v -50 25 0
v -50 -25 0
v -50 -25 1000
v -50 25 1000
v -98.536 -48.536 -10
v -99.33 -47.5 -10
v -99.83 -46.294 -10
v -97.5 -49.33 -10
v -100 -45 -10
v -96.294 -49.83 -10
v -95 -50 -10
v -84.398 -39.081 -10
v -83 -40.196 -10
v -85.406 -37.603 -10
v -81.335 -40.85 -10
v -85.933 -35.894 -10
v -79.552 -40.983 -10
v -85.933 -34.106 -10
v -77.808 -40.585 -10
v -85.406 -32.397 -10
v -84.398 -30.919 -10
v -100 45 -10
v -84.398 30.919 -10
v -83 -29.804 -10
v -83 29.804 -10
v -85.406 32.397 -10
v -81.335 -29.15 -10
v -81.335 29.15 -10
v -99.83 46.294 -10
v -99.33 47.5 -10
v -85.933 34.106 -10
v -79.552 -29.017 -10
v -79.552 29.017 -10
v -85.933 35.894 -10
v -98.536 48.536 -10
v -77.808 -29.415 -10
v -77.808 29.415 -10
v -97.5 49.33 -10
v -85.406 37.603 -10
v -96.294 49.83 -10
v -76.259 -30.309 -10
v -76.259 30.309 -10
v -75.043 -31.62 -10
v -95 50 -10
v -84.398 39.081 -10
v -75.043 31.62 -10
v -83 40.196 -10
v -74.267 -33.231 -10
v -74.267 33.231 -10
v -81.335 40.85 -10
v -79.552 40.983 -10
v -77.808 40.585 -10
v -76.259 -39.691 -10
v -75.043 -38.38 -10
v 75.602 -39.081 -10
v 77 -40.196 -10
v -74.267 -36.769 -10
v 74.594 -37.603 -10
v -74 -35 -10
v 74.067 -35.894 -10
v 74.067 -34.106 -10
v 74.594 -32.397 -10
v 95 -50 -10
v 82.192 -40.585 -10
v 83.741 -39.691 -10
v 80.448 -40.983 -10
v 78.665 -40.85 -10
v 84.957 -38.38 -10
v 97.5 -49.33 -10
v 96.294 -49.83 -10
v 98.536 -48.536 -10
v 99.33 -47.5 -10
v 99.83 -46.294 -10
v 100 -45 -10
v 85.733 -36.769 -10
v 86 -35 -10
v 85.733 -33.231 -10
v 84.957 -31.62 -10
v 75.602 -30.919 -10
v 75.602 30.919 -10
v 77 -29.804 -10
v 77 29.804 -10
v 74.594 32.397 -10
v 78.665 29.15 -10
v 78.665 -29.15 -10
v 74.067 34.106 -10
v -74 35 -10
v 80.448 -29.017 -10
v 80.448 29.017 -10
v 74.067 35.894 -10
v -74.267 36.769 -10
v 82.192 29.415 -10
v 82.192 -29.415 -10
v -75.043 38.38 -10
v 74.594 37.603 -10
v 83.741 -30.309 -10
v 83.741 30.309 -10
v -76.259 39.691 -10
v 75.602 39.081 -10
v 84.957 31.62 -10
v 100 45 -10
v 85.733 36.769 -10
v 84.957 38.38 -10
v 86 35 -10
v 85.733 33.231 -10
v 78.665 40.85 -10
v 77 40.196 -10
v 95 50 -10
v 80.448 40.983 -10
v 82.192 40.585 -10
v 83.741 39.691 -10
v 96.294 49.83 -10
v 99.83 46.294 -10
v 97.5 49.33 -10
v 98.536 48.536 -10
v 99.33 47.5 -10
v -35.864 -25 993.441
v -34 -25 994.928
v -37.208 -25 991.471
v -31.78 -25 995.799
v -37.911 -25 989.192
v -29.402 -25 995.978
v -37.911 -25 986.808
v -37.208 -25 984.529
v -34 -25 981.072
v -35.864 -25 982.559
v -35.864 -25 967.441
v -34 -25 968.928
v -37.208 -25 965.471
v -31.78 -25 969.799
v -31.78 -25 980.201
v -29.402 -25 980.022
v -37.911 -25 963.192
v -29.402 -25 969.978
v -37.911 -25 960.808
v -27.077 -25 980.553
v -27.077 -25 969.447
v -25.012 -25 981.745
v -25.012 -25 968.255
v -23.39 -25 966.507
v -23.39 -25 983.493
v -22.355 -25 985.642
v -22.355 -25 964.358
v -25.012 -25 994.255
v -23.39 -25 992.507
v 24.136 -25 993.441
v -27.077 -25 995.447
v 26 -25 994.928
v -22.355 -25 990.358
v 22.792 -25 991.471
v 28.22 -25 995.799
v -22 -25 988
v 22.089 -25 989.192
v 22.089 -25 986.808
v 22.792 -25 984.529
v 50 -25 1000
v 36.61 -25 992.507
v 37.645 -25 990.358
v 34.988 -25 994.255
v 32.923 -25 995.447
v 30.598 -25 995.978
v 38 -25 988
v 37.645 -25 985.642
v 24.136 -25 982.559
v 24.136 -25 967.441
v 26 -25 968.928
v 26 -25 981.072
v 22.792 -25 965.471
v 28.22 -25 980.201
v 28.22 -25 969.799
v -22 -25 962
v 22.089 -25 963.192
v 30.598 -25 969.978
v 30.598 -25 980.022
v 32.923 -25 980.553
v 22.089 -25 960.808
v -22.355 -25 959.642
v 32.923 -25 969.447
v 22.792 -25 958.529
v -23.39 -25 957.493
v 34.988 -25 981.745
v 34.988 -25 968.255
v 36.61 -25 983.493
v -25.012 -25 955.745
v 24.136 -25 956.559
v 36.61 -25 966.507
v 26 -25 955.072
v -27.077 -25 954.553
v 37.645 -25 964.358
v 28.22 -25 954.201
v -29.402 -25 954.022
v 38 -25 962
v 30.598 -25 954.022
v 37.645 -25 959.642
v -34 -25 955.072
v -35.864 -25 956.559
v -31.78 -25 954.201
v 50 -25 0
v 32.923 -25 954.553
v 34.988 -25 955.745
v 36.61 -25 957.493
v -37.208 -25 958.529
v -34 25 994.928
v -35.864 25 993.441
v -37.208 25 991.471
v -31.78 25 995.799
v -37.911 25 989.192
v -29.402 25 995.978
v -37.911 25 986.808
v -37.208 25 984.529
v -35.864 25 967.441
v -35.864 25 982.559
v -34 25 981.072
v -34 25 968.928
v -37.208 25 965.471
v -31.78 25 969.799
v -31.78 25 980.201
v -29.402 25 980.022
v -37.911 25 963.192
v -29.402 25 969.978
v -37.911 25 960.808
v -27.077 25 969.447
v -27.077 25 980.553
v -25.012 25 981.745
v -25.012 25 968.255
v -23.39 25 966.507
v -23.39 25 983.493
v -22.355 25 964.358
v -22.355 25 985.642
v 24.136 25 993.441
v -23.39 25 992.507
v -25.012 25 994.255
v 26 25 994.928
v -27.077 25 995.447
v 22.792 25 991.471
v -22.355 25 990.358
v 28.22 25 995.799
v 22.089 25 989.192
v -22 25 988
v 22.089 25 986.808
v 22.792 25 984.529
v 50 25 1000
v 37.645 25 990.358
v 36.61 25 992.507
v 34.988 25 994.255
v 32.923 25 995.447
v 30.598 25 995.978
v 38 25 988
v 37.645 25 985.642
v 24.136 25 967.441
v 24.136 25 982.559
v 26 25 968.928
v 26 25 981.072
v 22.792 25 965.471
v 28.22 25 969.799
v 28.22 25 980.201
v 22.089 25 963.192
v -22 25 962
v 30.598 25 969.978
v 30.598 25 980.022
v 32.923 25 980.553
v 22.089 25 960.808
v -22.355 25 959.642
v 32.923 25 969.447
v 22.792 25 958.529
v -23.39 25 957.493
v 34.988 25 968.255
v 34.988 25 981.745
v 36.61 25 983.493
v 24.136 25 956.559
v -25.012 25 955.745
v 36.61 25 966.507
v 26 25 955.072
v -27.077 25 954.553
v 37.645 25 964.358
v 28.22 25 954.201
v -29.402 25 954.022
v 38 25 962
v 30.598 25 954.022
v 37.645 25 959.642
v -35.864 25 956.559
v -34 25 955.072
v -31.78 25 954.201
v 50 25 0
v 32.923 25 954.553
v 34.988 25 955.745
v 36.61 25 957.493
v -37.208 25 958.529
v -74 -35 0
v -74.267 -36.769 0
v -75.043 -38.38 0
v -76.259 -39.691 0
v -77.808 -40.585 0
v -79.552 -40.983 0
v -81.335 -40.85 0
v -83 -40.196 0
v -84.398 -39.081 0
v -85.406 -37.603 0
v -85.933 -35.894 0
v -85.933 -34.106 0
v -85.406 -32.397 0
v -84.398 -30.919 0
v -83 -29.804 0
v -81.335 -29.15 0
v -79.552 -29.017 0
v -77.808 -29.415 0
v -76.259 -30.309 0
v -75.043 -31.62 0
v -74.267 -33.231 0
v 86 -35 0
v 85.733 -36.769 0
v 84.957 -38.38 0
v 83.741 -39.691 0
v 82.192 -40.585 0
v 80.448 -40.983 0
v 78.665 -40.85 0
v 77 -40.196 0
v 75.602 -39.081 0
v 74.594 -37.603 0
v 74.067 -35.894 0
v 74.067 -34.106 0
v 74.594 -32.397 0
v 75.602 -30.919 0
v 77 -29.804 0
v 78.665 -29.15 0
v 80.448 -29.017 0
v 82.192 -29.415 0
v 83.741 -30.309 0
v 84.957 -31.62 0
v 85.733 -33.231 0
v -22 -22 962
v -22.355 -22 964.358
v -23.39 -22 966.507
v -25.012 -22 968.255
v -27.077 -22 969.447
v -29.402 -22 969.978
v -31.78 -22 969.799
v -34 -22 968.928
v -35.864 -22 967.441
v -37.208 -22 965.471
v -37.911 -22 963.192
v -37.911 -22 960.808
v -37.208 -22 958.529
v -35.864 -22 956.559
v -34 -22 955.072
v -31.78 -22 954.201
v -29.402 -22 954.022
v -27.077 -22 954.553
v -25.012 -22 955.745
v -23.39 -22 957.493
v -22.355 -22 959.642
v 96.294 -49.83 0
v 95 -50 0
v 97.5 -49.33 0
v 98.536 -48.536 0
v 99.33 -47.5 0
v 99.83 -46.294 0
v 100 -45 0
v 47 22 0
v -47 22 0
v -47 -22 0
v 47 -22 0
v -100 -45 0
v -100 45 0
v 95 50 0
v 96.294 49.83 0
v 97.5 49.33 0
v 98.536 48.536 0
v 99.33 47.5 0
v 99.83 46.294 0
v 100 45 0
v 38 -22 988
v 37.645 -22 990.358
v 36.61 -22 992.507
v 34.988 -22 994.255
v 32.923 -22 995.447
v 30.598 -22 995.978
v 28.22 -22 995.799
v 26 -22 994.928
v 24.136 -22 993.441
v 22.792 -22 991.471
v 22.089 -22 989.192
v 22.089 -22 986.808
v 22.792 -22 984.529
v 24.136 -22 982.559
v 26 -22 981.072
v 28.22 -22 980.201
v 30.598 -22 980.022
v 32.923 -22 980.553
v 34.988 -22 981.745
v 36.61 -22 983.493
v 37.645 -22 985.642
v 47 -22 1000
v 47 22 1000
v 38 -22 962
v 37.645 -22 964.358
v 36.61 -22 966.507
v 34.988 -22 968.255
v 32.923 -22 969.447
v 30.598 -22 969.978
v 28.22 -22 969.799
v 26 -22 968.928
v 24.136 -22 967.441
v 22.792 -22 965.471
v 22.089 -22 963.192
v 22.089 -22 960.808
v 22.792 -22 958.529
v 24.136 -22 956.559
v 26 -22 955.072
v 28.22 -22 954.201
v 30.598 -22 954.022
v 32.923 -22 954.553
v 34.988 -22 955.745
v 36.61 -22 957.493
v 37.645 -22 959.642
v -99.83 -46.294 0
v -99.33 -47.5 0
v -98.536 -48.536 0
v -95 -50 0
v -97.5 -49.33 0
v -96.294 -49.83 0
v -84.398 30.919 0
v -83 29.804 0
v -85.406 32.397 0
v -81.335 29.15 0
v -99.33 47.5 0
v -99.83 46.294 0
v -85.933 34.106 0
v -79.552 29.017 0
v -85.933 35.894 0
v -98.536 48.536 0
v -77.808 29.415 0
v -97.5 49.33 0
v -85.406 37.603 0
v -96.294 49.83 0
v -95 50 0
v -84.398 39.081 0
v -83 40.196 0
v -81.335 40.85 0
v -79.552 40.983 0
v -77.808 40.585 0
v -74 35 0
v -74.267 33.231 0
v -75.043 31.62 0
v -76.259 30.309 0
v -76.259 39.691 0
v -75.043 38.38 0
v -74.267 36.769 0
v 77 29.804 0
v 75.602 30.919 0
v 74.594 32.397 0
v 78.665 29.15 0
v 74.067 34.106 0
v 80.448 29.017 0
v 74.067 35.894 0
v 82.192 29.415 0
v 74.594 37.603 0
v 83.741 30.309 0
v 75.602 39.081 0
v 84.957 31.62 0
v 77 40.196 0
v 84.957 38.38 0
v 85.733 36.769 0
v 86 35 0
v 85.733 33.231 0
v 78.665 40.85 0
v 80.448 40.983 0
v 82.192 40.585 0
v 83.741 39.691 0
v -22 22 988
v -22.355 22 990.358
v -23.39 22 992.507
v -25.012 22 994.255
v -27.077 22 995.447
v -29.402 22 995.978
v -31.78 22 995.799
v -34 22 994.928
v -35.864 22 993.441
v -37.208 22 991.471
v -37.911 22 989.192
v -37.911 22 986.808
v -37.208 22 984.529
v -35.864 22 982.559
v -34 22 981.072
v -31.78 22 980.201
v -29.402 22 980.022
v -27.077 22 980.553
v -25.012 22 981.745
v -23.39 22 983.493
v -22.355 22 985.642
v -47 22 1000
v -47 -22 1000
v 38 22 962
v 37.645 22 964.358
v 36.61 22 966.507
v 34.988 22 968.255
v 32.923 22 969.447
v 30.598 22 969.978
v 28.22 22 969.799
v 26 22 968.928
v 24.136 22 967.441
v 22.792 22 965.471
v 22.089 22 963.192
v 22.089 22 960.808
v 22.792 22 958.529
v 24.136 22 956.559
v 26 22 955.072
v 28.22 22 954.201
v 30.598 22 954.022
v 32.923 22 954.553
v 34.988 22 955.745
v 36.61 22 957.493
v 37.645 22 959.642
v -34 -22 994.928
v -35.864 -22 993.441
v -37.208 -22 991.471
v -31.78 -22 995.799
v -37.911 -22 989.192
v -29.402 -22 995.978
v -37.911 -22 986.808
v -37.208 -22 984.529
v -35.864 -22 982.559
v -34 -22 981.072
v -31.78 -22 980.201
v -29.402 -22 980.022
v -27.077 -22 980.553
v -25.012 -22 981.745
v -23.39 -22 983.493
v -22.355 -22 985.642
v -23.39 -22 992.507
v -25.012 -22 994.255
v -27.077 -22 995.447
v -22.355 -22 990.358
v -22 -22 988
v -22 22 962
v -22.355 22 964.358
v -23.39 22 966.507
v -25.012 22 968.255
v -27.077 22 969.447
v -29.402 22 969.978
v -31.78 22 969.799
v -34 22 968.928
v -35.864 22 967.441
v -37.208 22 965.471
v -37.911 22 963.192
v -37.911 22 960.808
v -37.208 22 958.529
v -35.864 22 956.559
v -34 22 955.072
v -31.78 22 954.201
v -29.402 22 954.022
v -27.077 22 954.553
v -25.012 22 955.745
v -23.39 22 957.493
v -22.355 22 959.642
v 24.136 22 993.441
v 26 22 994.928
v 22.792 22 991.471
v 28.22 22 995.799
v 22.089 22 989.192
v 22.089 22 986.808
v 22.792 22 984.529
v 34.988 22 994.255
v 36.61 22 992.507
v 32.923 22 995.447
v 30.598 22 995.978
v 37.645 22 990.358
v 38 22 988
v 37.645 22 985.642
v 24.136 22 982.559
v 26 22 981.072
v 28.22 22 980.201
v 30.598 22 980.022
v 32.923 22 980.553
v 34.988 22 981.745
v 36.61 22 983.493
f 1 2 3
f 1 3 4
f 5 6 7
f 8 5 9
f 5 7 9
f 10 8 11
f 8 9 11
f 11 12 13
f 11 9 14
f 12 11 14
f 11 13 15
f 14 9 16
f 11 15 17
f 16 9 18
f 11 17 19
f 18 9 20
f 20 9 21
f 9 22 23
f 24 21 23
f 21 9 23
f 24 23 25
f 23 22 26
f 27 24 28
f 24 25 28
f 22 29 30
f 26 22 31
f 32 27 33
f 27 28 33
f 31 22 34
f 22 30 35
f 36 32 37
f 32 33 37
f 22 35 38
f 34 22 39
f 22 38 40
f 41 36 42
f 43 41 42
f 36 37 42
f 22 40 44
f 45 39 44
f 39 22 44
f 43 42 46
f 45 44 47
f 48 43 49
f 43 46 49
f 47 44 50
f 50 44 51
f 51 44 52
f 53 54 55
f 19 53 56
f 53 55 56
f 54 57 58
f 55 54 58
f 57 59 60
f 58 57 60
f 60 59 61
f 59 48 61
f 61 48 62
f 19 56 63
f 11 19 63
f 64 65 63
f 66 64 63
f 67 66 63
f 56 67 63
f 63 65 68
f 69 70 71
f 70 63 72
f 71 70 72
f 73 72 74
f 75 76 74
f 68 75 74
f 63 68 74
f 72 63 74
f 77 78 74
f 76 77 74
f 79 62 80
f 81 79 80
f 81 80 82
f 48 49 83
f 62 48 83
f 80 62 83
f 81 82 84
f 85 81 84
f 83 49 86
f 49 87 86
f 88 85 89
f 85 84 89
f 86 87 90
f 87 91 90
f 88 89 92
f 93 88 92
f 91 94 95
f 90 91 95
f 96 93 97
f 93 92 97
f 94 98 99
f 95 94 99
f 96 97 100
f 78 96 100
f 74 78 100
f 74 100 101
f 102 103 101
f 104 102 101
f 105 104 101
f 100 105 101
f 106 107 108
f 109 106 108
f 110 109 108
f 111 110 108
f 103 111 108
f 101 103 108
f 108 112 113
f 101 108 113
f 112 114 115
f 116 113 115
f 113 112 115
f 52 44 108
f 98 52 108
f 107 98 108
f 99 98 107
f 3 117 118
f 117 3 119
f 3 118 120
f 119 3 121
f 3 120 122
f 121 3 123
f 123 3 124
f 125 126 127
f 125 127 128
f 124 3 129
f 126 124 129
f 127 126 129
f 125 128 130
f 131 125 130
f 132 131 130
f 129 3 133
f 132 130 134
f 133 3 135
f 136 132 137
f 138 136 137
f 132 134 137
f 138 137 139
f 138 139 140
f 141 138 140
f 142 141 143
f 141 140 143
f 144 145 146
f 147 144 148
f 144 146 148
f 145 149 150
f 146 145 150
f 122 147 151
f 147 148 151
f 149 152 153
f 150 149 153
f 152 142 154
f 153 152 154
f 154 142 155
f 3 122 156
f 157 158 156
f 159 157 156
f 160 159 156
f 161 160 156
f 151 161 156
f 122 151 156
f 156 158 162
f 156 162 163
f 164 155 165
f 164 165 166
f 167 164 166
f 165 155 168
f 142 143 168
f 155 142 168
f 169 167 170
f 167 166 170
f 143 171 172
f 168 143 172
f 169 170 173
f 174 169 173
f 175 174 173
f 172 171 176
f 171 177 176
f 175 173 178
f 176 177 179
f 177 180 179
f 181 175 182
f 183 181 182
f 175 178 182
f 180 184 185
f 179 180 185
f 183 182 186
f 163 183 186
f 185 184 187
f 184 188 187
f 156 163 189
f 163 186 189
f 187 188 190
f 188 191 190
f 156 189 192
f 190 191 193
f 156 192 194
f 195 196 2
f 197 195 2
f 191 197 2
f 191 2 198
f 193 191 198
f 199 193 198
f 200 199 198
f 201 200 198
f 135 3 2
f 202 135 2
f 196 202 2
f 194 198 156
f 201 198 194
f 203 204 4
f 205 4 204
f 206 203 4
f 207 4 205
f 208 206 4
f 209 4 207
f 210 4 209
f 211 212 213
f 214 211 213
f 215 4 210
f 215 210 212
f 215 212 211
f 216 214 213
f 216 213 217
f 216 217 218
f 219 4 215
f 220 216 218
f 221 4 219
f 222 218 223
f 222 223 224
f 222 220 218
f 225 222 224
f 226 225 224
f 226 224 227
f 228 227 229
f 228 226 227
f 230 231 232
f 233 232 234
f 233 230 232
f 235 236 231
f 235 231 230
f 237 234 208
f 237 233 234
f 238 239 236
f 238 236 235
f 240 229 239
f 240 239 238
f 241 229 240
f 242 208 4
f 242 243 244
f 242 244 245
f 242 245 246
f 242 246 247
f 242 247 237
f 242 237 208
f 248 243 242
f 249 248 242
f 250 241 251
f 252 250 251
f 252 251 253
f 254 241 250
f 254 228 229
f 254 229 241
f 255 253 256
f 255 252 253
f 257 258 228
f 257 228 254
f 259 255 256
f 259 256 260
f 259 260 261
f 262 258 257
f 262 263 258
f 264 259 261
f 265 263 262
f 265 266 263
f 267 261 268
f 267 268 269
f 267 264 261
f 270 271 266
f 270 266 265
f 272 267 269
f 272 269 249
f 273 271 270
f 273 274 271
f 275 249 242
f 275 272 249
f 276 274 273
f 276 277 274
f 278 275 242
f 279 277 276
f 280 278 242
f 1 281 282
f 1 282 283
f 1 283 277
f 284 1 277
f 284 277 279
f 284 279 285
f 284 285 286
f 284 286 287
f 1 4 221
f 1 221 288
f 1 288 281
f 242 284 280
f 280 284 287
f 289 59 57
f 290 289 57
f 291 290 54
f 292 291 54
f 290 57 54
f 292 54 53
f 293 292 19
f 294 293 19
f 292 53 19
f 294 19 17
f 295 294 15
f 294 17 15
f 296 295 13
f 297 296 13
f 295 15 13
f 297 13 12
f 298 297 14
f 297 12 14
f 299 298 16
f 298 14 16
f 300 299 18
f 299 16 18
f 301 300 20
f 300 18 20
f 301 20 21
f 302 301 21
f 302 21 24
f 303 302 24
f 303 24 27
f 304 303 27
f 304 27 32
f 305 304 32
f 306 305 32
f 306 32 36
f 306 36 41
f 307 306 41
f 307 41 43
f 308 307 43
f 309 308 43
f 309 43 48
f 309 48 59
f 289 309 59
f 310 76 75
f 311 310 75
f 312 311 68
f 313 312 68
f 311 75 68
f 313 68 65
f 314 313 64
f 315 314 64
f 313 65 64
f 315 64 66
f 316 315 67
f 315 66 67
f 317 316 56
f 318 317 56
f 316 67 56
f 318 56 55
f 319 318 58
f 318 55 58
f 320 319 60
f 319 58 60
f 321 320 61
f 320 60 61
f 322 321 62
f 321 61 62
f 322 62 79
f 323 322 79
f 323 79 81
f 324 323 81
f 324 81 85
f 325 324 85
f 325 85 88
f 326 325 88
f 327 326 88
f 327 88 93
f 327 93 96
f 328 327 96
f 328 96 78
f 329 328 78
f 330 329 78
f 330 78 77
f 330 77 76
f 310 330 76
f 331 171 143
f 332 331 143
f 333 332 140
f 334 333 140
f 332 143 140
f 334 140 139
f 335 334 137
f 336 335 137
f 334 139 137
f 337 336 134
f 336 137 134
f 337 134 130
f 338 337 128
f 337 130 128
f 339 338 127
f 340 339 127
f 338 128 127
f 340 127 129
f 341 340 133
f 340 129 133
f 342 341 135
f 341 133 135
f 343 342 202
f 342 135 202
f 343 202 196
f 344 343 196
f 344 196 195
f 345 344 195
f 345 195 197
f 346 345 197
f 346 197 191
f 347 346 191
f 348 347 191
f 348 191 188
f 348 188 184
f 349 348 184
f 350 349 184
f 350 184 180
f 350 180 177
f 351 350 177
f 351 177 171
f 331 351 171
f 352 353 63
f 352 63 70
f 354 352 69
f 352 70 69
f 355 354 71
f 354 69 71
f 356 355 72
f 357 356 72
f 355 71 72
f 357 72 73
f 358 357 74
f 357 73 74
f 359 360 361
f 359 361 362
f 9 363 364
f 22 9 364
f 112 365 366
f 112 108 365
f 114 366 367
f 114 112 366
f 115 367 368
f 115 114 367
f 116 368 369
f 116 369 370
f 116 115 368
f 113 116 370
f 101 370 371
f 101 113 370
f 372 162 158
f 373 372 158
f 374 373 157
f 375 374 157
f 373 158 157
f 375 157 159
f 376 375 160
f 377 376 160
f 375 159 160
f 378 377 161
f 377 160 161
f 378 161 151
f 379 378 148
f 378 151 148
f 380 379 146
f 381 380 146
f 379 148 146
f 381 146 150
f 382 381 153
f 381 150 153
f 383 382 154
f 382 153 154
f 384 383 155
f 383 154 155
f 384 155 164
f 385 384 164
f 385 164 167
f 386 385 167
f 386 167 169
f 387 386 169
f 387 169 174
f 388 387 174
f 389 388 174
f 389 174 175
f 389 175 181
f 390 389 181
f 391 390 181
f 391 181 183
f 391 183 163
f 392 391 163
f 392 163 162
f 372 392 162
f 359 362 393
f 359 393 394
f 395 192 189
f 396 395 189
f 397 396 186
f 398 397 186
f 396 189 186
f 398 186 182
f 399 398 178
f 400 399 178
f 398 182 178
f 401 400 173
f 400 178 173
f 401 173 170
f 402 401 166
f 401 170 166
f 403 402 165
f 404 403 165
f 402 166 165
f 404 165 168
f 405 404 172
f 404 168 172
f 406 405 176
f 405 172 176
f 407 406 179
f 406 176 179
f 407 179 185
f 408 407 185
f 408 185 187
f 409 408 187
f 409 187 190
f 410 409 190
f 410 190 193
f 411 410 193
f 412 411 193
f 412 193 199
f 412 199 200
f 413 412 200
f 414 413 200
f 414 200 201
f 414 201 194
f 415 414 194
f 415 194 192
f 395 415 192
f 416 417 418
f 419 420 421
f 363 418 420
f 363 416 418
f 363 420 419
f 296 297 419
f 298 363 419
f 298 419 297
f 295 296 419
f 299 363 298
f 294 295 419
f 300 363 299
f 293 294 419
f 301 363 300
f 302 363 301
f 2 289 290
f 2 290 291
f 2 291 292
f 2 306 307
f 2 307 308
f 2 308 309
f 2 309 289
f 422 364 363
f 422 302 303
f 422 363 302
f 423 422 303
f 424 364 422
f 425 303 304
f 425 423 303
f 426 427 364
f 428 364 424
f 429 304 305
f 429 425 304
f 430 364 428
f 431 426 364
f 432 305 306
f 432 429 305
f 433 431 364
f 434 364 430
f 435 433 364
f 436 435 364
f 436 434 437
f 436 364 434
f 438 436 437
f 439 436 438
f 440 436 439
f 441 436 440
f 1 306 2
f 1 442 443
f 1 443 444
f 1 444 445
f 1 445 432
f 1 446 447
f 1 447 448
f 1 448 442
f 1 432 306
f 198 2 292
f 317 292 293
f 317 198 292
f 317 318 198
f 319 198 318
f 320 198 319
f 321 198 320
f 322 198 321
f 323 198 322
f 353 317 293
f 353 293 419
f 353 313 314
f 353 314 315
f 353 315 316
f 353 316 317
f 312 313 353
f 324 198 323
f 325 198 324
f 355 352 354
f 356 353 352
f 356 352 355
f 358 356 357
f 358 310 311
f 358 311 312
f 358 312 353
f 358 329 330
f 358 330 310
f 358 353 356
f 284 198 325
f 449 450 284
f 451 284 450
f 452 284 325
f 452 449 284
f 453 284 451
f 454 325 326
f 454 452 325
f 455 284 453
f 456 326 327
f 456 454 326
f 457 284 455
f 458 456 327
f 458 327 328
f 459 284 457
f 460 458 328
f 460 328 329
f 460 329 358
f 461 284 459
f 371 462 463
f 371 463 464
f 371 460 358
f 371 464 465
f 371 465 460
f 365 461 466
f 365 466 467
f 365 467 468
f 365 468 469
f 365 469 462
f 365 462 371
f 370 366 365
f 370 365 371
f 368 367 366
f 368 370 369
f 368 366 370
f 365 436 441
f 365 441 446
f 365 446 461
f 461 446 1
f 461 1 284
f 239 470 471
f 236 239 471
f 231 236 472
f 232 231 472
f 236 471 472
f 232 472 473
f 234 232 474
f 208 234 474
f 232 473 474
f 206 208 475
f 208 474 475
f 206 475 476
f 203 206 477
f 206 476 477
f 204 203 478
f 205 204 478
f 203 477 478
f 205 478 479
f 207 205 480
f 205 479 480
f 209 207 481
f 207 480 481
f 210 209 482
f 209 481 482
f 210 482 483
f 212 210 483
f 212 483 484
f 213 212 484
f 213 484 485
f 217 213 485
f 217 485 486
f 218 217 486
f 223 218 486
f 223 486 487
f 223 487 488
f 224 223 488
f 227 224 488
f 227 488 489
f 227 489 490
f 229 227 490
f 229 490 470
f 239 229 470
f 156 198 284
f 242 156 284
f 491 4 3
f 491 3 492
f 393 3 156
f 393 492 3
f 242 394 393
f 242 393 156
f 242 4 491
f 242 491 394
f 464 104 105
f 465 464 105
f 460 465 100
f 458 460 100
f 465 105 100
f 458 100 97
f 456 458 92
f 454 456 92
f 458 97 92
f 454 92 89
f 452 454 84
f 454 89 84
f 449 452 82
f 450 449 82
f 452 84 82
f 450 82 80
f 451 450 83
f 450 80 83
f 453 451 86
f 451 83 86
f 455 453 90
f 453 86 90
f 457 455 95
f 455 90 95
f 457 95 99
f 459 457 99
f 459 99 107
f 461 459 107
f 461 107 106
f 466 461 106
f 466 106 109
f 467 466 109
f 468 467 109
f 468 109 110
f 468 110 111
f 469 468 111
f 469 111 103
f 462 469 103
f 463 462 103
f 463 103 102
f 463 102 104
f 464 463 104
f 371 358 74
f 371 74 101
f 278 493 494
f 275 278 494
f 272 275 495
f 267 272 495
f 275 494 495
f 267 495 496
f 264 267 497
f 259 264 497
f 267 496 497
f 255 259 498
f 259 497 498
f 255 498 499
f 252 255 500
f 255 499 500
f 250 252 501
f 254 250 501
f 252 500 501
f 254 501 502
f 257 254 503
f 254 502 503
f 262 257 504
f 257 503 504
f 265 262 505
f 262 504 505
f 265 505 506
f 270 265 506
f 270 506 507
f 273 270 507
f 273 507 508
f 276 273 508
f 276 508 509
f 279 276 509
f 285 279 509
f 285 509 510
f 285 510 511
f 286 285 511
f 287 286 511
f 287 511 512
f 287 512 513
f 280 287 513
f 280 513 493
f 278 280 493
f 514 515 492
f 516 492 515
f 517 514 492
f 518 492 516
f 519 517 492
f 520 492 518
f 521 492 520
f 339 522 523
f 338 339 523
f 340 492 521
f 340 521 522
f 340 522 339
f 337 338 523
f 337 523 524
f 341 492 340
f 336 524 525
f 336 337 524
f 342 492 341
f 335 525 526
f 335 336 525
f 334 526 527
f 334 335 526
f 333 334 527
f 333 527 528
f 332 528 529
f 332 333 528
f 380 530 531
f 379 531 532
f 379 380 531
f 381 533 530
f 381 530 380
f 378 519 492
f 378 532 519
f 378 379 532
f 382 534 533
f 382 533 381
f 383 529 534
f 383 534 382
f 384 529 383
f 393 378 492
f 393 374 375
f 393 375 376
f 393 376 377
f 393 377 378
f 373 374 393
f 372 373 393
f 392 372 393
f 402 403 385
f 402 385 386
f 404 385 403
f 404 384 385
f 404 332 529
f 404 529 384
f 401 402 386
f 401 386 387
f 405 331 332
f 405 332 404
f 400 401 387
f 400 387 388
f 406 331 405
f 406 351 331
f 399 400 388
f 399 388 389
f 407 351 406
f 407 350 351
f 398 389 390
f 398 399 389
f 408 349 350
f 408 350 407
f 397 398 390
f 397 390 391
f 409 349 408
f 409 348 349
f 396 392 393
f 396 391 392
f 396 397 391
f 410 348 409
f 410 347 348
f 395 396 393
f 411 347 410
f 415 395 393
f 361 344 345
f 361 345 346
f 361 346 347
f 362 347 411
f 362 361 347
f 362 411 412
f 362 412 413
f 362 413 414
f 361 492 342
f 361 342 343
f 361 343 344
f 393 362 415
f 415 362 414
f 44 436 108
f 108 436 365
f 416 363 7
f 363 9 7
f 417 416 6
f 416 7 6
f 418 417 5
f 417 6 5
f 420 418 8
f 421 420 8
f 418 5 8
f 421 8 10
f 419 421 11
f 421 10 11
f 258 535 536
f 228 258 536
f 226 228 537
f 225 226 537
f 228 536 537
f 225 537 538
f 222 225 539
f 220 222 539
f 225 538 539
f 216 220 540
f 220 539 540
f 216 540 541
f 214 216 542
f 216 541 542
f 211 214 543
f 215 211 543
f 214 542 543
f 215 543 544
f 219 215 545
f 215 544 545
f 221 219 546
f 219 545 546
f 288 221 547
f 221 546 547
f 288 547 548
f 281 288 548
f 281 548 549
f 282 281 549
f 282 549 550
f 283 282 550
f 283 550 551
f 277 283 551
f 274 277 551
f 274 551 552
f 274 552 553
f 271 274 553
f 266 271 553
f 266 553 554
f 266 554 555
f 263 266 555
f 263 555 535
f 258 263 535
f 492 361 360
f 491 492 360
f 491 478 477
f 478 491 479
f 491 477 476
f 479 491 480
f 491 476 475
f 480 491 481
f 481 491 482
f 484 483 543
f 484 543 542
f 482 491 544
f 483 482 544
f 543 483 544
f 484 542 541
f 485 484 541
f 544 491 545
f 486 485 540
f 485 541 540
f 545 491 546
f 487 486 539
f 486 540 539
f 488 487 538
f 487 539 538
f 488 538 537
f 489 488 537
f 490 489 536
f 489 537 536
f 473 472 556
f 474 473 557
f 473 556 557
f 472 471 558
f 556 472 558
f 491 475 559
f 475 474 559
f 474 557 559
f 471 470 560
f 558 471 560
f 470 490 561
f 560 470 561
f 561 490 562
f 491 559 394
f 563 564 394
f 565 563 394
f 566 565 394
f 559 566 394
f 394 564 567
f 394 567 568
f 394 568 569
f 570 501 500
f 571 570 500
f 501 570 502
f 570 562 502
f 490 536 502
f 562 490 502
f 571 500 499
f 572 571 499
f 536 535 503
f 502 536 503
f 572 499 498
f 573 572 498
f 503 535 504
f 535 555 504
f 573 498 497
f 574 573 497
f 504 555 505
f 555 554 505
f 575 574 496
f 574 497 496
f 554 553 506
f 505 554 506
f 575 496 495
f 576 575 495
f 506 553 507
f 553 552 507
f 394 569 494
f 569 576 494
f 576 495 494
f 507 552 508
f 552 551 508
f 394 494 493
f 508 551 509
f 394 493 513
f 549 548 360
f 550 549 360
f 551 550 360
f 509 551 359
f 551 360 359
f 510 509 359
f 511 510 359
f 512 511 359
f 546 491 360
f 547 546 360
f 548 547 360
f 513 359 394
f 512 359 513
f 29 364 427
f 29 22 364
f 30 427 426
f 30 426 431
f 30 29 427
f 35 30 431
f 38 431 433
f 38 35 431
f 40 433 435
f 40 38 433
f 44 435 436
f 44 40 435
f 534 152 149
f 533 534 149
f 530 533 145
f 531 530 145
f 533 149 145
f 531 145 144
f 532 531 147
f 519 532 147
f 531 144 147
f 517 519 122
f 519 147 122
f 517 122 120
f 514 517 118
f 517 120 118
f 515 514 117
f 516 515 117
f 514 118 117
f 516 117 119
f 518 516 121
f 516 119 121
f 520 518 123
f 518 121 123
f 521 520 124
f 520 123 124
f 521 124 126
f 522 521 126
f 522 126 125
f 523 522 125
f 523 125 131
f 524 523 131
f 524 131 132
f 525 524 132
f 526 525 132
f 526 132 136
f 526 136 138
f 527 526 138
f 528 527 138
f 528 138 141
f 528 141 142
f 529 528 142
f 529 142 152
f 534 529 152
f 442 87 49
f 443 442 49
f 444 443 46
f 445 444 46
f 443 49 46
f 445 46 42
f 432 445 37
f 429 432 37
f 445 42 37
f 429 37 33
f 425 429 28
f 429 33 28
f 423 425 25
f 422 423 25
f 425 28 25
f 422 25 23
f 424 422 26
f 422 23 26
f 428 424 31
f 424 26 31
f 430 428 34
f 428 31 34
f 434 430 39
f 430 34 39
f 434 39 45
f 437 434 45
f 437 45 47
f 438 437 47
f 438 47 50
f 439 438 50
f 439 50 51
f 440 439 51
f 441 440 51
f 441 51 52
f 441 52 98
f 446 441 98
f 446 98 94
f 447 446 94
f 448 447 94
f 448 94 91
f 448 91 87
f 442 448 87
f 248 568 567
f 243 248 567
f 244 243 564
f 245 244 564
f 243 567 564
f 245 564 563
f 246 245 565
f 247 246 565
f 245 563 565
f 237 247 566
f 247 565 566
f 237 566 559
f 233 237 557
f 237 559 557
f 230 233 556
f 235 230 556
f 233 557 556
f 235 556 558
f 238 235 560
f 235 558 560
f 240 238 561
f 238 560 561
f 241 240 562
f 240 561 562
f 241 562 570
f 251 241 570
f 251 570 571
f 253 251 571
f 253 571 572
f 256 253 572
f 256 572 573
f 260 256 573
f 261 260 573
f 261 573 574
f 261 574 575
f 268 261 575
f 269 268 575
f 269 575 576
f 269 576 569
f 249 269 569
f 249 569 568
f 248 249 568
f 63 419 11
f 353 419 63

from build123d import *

# Parameters (mm, degrees)
F0_W     = 100
F0_H     = 50
F0_W_2   = 94
F0_H_2   = 44
F1_DEPTH = 1000
F2_W     = 200
F2_H     = 100
F3_DEPTH = 10
F4_R     = 6
F5_DEPTH = 25
F6_R     = 5
F7_R     = 8
F8_DEPTH = 50


with BuildPart() as f1:
    # F0 (on Top) → F1 (new body)
    with BuildSketch(Plane.XY):
        Rectangle(F0_W, F0_H)
        Rectangle(F0_W_2, F0_H_2, mode=Mode.SUBTRACT)
    extrude(amount=F1_DEPTH)

    # F2 (on Top) → F3 (join)
    with BuildSketch(Plane.XY):
        Rectangle(F2_W, F2_H)
    extrude(amount=-F3_DEPTH)

    # F4 (on face) → F5 (cut)
    with BuildSketch(Plane(origin=(0, 0, -10), x_dir=(1, 0, 0), z_dir=(0, 0, -1))):
        with Locations((-80, 35)):
            Circle(F4_R)
        with Locations((-80, -35)):
            Circle(F4_R)
        with Locations((80, 35)):
            Circle(F4_R)
        with Locations((80, -35)):
            Circle(F4_R)
    extrude(amount=-F5_DEPTH, mode=Mode.SUBTRACT)

    # F6
    f6_edges = [f1.edges().sort_by_distance(p)[0] for p in [
        (100, -50, -5),
        (100, 50, -5),
        (-100, -50, -5),
        (-100, 50, -5),
    ]]
    fillet(f6_edges, radius=F6_R)

    # F7 (on face) → F8 (cut)
    with BuildSketch(Plane.XZ.offset(25)):
        with Locations((-30, 988)):
            Circle(F7_R)
        with Locations((30, 988)):
            Circle(F7_R)
        with Locations((30, 962)):
            Circle(F7_R)
        with Locations((-30, 962)):
            Circle(F7_R)
    extrude(amount=-F8_DEPTH, mode=Mode.SUBTRACT)


solid = f1.part
